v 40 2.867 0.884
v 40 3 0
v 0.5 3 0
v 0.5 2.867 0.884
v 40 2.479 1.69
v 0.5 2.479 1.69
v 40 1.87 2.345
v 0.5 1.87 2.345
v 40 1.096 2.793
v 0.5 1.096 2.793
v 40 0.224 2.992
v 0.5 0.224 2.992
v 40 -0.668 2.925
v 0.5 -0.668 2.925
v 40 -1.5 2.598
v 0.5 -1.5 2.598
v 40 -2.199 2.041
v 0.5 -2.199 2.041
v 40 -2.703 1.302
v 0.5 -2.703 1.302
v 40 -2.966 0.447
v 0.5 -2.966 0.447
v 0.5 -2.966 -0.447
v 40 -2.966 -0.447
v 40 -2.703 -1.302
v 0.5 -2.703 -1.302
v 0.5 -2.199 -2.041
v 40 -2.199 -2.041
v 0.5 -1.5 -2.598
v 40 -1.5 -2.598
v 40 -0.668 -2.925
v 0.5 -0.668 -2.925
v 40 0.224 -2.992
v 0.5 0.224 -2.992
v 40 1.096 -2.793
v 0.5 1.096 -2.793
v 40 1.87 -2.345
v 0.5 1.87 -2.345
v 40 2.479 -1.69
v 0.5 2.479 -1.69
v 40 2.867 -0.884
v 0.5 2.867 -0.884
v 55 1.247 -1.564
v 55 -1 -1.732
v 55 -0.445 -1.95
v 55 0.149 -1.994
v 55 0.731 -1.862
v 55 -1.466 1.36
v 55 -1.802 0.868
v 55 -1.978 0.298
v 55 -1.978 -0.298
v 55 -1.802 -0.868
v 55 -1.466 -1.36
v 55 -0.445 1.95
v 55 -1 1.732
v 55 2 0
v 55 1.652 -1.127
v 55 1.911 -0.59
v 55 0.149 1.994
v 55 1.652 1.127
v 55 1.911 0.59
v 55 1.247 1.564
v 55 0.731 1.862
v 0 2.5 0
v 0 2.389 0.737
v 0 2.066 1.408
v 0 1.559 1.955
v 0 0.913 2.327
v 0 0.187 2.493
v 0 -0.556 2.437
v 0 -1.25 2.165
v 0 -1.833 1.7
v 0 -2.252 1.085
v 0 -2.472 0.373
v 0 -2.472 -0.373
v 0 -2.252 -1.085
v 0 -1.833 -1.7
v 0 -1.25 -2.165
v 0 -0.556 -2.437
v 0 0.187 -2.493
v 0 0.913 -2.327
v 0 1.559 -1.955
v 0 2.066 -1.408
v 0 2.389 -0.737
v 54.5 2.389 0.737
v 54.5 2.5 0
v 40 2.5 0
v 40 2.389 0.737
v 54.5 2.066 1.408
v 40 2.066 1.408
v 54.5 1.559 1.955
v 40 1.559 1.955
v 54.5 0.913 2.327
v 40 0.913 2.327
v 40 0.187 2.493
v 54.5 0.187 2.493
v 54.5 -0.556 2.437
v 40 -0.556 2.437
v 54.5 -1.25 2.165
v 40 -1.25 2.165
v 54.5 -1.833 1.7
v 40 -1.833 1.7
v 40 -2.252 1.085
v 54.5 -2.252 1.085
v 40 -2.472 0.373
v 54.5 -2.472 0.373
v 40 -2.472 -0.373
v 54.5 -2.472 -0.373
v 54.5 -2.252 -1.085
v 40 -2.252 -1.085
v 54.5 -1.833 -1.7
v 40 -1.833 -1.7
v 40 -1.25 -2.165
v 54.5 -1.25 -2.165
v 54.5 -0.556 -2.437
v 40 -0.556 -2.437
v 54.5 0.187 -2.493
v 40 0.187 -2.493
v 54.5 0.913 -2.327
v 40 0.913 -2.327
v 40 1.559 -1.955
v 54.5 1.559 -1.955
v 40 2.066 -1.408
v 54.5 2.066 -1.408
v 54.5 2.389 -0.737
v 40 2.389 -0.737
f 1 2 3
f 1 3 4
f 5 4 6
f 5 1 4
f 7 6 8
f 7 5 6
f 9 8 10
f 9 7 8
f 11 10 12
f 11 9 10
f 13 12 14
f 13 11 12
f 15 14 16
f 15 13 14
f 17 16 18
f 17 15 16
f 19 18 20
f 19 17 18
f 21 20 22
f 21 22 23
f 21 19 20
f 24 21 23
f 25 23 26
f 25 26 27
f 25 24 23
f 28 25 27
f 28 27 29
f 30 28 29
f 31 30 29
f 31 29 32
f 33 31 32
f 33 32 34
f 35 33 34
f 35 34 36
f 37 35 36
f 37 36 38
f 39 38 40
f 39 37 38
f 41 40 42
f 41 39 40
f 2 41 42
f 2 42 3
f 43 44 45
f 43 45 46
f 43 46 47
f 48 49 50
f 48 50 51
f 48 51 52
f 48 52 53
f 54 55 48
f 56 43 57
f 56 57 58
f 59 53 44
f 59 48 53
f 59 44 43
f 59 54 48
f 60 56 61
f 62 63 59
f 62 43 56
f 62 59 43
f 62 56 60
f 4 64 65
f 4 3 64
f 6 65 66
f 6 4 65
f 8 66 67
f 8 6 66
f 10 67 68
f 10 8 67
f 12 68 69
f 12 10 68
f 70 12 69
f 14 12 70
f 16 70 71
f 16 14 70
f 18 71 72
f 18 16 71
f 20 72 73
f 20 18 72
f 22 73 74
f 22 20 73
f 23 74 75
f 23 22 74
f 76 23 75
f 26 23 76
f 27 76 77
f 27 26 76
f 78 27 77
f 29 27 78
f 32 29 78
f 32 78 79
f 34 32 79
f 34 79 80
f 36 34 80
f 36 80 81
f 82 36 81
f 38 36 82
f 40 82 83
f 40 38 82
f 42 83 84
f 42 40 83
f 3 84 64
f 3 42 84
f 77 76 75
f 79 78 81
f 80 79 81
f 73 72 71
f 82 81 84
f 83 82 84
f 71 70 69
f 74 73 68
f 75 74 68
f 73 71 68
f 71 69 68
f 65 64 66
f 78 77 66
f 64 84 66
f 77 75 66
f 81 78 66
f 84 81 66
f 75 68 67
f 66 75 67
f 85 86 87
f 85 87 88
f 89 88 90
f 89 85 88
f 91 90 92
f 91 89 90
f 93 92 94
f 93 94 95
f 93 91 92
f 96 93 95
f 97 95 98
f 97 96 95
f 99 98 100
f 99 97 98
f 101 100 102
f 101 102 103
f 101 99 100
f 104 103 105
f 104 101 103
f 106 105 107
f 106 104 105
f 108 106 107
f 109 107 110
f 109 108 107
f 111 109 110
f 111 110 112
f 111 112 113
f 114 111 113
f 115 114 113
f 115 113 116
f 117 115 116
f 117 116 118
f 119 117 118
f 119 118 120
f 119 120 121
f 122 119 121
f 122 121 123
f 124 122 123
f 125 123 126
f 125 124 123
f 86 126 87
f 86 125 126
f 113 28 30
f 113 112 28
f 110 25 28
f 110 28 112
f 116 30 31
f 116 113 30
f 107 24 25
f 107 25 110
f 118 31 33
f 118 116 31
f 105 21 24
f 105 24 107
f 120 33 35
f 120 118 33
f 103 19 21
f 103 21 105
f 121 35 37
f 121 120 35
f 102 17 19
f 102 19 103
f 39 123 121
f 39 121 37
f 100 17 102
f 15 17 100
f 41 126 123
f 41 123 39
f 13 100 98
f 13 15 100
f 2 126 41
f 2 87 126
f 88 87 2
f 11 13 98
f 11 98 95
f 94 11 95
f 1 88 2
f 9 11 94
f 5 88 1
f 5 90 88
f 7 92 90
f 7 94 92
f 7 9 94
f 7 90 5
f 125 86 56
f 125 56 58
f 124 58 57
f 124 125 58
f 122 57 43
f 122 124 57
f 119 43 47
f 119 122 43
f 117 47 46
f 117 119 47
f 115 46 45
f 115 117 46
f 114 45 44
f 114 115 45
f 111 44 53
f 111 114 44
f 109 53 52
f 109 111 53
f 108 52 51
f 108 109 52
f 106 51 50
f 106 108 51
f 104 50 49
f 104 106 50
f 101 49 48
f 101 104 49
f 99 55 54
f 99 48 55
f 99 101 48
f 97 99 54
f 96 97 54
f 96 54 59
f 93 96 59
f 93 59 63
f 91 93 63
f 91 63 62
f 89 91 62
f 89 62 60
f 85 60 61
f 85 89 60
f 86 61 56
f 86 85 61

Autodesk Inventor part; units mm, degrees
ref_plane "Startebene" through (0, 0, 0) normal (1, 0, 0) x (0, 1, 0)
ref_plane "XZ Plane" through (0, 0, 0) normal (0, 1, 0) x (-1, 0, 0)
ref_plane "XY Plane" through (0, 0, 0) normal (0, 0, 1) x (1, 0, 0)
sketch "Hauptskizze" plane through (0, 0, 0) normal (0, 0, 1) x (1, 0, 0)
  line L0 (0, 0) -> (55, 0)
  line L1 (0, 0) -> (0, 3)
  line L2 (40, 3) -> (40, 2.5)
  line L3 (0, 3) -> (40, 3)
  line L4 (55, 2.5) -> (55, 0)
  line L5 (40, 2.5) -> (55, 2.5)
  dimension "d3" = 6
  dimension "d14" = 5
revolve "Umdrehung1" add sketch "Hauptskizze" angle 360 about axis through (0, 0, 0) along (1, 0, 0)
chamfer "Fase4" distance 0.5 angle 45 1 edges at (0, -3, 0) measured on face at (26.6667, 2.9612, -0.4812)
chamfer "Fase5" distance 0.5 angle 45 1 edges at (55, -2.5, 0) measured on face at (50, 2.4919, -0.2012)
properties part number "Welle 5x15+6x45" material "Steel"
